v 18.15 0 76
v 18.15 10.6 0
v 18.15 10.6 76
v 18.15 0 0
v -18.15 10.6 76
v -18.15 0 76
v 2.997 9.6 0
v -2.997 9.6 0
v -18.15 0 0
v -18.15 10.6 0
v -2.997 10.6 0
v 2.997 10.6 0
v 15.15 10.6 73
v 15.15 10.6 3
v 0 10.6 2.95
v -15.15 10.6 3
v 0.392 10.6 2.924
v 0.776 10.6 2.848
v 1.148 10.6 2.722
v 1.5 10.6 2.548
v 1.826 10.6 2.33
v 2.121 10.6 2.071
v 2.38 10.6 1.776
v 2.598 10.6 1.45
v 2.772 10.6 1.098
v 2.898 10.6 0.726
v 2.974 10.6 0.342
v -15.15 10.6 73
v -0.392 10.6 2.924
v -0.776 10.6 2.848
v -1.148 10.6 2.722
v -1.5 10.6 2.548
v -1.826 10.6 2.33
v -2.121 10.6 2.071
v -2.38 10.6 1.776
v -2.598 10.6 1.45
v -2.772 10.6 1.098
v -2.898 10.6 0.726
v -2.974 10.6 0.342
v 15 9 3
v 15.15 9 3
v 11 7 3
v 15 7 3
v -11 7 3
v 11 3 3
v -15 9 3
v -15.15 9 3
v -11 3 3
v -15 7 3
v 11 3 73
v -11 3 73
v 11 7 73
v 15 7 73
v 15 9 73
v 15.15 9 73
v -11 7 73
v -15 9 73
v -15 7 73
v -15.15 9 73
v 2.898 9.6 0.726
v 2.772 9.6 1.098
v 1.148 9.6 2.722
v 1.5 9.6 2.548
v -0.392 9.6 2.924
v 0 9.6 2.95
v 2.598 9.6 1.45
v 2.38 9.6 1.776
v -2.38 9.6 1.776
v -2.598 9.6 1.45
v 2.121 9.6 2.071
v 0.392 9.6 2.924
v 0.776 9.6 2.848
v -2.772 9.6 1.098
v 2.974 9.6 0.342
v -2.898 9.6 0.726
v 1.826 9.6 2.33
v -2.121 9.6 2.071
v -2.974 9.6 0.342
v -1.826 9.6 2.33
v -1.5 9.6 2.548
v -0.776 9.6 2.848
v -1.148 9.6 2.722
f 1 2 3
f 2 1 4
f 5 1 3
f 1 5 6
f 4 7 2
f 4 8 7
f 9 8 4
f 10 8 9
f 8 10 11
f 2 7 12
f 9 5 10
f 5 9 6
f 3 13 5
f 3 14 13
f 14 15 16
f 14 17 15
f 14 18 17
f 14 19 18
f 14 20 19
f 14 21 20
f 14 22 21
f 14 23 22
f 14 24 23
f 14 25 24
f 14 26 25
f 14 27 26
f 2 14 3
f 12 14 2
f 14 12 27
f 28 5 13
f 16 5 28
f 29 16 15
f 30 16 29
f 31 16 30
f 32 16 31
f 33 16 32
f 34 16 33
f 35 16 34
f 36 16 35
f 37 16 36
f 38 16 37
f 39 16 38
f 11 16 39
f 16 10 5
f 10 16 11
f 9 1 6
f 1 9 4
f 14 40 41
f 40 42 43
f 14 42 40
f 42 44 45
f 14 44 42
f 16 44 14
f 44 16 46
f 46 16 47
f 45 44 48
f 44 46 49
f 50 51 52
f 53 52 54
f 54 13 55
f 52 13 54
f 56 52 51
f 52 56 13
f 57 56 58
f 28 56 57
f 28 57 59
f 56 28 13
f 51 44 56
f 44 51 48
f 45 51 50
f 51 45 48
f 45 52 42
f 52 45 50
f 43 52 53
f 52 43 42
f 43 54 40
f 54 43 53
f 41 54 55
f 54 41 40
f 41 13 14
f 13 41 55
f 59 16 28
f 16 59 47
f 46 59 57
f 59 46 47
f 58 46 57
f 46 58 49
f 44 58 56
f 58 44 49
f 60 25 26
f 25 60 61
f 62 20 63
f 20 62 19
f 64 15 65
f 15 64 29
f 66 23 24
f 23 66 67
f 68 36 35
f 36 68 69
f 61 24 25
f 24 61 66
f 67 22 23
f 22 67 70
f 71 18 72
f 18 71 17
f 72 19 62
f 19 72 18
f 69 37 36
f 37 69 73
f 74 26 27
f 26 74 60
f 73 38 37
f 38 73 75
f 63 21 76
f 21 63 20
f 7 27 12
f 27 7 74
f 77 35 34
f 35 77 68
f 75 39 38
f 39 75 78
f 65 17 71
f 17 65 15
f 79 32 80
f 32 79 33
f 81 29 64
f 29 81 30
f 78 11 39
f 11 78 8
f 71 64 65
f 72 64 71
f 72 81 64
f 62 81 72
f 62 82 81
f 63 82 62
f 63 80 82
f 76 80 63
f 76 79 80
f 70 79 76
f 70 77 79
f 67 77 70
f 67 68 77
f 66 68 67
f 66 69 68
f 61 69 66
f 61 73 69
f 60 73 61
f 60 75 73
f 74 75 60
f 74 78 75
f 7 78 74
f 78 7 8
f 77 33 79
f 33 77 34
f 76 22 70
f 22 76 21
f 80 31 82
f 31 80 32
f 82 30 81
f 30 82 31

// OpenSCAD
// Render target: the 3D-printed silicone-pour mold.
//   openscad -o ../stl/lens_mold.stl lens_mold.scad
include <enclosure.scad>
lens_mold();
